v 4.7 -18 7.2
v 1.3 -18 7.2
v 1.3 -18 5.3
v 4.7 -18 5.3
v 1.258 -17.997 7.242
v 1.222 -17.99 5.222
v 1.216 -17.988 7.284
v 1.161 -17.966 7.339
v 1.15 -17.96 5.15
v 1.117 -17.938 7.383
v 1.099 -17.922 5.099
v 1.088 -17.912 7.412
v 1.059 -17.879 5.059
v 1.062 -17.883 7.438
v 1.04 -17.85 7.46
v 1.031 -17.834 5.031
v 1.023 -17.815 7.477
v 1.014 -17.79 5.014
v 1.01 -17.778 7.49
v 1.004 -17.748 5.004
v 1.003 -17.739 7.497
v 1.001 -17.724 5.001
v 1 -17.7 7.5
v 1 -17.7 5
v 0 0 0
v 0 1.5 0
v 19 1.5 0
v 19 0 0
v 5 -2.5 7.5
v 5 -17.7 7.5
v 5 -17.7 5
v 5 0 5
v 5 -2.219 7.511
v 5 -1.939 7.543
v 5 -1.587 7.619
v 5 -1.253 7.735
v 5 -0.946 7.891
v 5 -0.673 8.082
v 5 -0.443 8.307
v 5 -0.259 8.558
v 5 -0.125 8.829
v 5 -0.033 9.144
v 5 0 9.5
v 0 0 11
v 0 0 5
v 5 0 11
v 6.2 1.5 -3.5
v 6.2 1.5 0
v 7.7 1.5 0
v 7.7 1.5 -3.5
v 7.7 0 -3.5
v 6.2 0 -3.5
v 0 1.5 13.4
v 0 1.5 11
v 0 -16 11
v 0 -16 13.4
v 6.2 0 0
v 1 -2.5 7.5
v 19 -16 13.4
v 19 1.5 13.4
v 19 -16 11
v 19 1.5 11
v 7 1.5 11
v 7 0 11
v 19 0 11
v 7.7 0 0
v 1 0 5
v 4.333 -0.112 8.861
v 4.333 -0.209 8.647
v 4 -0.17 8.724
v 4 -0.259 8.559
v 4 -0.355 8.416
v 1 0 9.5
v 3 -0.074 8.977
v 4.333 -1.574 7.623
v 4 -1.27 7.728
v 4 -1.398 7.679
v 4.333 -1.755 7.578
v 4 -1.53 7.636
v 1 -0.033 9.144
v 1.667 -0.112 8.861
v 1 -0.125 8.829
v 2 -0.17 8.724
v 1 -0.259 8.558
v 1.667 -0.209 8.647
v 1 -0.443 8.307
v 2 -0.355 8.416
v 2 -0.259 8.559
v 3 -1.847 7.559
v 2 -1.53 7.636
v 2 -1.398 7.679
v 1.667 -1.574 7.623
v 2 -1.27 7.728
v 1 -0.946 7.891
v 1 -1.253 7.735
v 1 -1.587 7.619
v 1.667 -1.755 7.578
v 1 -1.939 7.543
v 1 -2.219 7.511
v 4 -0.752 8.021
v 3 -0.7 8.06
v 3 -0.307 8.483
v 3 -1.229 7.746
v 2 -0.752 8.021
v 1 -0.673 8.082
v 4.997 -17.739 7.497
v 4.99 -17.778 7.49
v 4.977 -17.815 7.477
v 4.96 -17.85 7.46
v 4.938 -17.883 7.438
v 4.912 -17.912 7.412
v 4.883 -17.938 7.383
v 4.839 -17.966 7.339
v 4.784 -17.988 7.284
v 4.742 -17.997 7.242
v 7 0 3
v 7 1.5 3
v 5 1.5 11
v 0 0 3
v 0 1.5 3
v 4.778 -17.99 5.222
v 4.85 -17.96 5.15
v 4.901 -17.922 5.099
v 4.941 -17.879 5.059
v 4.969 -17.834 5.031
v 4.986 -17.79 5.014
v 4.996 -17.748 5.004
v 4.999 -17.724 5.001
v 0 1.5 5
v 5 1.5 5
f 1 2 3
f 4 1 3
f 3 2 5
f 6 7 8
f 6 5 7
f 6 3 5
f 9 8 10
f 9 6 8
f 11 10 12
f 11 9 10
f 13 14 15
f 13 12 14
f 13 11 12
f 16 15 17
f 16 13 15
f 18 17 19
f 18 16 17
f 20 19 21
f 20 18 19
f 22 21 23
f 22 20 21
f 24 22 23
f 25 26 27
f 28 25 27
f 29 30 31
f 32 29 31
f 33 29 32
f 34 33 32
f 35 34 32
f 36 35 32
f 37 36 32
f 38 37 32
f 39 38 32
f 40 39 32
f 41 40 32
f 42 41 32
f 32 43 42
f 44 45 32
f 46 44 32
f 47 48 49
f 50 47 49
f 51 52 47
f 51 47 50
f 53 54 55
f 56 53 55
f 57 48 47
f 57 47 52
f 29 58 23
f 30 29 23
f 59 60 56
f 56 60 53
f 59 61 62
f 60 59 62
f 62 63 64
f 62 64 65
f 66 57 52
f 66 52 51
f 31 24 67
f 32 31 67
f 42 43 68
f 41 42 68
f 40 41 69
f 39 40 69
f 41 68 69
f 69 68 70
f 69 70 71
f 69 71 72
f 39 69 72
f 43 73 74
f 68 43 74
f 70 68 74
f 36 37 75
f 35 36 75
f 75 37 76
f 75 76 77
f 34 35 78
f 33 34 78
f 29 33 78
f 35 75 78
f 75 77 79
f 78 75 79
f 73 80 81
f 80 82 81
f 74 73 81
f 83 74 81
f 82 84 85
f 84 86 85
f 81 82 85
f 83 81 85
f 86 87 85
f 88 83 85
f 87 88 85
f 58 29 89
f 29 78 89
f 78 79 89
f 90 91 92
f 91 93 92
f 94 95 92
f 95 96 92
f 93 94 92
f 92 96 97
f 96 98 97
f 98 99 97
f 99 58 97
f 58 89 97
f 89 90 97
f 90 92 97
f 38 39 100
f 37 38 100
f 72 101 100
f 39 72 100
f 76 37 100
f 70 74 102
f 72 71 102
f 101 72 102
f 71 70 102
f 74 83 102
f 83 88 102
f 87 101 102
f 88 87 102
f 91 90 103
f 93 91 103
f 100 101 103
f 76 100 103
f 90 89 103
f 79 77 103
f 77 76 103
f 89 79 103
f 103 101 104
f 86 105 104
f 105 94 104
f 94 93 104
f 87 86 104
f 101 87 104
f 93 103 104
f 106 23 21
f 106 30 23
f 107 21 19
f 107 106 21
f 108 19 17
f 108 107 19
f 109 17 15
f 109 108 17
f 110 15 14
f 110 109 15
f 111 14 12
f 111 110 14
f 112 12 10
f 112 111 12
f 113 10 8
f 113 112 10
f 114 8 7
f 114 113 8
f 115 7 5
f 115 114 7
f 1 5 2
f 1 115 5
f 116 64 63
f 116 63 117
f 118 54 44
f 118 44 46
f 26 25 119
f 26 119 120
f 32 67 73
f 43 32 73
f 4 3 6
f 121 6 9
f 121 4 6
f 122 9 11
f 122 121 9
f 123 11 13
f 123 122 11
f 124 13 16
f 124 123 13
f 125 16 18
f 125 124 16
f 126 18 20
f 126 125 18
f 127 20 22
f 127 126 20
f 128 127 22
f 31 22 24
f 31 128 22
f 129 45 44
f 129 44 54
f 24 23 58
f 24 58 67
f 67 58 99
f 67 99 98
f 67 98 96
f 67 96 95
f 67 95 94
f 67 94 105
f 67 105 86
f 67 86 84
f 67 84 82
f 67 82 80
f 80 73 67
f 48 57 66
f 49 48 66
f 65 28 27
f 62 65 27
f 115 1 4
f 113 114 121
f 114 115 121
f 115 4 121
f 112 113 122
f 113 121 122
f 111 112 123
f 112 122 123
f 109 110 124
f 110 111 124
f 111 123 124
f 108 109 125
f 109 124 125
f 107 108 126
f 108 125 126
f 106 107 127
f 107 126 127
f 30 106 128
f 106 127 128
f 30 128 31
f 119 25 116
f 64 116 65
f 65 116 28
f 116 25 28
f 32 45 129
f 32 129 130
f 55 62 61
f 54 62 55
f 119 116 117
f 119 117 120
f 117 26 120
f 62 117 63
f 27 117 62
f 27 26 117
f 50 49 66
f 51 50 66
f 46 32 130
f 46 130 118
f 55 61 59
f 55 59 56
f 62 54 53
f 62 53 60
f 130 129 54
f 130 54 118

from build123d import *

# Parameters (mm, degrees)
EXTRUDE001_DEPTH = 2.4
EXTRUDE002_DEPTH = 4
FILLET_R         = 0.3
SKETCH003_W      = 1.5
SKETCH003_H      = 1.5
EXTRUDE003_DEPTH = 3.5
EXTRUDE004_DEPTH = 1.5
SKETCH_W         = 19
SKETCH_H         = 1.5
EXTRUDE_DEPTH    = 11


with BuildPart() as extrude001:
    # Sketch001 (on Face6 of Extrude) → Extrude001 (new body)
    with BuildSketch(Plane.XY.offset(11)):
        Polygon((19, 0), (19, -16), (0, -16), (0, 0), (0, 1.5), (19, 1.5), align=None)
    extrude(amount=EXTRUDE001_DEPTH)


with BuildPart() as fillet_body:
    # Sketch002 (on Face4 of Extrude) → Extrude002 (new body)
    with BuildSketch(Plane(origin=(0, 0, 0), x_dir=(0, -1, 0), z_dir=(-1, 0, 0))):
        with BuildLine():
            Line((2.5, 7.5), (18, 7.5))
            Line((18, 7.5), (18, 5))
            Line((18, 5), (0, 5))
            Line((0, 5), (0, 9.5))
            add(Edge.make_bspline(
                [(0, 9.5), (0, 7.5), (2.5, 7.5)],
                knots=[5.987452, 5.987452, 5.987452, 7.325142, 7.325142, 7.325142], degree=2, weights=[1, 0.784538, 1]))
        make_face()
    extrude(amount=-EXTRUDE002_DEPTH)


with BuildPart() as fillet_body_1:
    # Extrude002 placement: moved
    add(fillet_body.part.moved(Location((1, 0, 0))))

    # Fillet
    fillet_edges = [fillet_body_1.edges().sort_by_distance(p)[0] for p in [
        (3, -18, 7.5),
        (3, -18, 5),
        (5, -18, 6.25),
        (1, -18, 6.25),
    ]]
    fillet(fillet_edges, radius=FILLET_R)


with BuildPart() as extrude003:
    # Sketch003 (on Face5 of Extrude) → Extrude003 (new body)
    with BuildSketch(Plane(origin=(0, 0, 0), x_dir=(1, 0, 0), z_dir=(0, 0, -1))):
        with Locations((6.95, -0.75)):
            Rectangle(SKETCH003_W, SKETCH003_H)
    extrude(amount=EXTRUDE003_DEPTH)


with BuildPart() as extrude004:
    # Sketch004 (on Face1 of Extrude) → Extrude004 (new body)
    with BuildSketch(Plane.XZ):
        Polygon((5, 11), (7, 11), (7, 3), (0, 3), (0, 5), (5, 5), align=None)
    extrude(amount=-EXTRUDE004_DEPTH)


with BuildPart() as cut:
    # Sketch → Extrude (new body)
    with BuildSketch(Plane.XY):
        with Locations((9.5, 0.75)):
            Rectangle(SKETCH_W, SKETCH_H)
    extrude(amount=EXTRUDE_DEPTH)

    # Cut: cut Extrude004
    add(extrude004.part, mode=Mode.SUBTRACT)


solid = Compound([extrude001.part, fillet_body_1.part, extrude003.part, cut.part])
